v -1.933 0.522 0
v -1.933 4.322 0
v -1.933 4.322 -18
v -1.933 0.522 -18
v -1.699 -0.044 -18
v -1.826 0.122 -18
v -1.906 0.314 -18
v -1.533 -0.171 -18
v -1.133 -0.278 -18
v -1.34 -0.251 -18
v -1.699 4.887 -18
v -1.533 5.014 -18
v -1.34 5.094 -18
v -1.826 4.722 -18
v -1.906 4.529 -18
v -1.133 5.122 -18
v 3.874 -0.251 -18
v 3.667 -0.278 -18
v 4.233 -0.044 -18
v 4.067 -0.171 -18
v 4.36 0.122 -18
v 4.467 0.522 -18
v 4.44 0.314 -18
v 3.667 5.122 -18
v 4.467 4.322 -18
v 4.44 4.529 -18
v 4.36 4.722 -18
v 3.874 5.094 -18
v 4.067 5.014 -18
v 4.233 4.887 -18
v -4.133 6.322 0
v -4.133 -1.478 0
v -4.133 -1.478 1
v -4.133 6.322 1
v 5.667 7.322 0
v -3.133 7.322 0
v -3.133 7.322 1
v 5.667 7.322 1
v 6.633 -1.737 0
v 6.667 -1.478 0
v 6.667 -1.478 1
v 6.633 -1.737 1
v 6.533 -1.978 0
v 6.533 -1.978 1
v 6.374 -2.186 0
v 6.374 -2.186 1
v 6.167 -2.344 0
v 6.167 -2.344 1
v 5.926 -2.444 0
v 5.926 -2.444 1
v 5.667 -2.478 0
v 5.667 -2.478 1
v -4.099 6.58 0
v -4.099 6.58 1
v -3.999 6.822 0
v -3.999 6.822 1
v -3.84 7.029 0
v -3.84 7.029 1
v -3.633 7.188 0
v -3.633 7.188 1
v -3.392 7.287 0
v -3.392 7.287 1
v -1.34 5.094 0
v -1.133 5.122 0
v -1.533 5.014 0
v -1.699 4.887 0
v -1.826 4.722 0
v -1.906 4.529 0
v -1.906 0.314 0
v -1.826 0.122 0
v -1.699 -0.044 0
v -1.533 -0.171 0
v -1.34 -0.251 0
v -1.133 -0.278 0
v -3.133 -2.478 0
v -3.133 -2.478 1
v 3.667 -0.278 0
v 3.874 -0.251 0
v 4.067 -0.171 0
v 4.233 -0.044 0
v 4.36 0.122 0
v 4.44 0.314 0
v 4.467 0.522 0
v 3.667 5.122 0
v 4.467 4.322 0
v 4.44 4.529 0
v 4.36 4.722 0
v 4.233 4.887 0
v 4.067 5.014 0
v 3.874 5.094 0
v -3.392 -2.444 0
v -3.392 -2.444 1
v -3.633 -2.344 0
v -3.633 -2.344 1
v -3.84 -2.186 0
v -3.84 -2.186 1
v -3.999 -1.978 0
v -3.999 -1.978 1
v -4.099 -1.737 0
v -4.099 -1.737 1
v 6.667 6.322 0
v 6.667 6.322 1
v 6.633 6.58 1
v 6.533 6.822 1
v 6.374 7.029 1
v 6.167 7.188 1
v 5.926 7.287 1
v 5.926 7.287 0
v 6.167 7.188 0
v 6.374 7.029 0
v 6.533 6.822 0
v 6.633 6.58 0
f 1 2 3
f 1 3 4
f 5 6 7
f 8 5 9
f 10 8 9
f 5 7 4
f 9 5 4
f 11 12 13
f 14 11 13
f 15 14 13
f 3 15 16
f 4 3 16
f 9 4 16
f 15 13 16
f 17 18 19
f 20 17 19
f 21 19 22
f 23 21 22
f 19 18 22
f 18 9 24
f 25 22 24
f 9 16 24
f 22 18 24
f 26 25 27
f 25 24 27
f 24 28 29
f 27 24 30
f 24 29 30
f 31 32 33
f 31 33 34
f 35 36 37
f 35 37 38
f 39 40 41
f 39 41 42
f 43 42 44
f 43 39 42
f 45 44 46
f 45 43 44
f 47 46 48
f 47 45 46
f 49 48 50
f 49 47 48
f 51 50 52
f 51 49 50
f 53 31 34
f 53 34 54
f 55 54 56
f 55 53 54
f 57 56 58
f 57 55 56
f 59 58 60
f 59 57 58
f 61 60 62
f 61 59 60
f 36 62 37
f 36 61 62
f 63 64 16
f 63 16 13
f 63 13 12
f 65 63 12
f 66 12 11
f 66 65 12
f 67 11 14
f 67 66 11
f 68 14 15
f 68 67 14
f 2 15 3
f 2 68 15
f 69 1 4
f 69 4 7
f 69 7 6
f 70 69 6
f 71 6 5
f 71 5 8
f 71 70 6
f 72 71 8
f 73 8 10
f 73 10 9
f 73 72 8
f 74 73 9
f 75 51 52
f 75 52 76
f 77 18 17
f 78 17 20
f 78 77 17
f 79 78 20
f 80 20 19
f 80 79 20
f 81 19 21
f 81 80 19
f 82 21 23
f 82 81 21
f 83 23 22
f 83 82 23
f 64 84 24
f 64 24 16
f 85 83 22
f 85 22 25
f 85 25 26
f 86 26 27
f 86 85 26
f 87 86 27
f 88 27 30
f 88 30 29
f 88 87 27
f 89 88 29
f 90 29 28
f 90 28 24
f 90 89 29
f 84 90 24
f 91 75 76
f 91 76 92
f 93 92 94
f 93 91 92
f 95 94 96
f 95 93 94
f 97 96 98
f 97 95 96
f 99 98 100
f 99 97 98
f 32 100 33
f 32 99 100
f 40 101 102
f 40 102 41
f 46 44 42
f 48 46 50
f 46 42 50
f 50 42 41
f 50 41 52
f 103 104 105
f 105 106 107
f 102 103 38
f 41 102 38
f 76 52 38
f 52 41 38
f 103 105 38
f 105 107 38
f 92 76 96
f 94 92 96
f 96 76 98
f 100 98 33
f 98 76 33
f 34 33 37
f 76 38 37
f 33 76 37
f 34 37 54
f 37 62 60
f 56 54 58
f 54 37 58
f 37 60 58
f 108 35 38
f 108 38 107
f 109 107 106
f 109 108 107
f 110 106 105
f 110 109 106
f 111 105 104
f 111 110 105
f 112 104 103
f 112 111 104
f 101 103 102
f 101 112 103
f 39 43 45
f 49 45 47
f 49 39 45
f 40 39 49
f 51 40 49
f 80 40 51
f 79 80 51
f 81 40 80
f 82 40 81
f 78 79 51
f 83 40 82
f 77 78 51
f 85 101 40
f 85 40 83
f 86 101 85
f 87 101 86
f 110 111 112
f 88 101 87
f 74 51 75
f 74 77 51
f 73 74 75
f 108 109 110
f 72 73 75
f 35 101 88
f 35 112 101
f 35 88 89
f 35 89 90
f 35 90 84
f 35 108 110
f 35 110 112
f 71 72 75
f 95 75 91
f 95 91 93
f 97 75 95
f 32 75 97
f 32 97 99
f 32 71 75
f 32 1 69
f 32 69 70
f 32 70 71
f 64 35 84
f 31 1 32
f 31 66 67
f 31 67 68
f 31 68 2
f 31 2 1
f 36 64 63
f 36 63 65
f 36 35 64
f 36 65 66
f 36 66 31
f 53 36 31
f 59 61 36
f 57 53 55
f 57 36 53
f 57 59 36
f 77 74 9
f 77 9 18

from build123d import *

# Parameters (mm, degrees)
EXTRUDE_1_DEPTH = 1
EXTRUDE_2_DEPTH = 18


with BuildPart() as part:
    # 草图1 → 凸台-拉伸1 (new body)
    with BuildSketch(Plane.XY):
        with BuildLine():
            Line((-3.132848788, 7.321546969), (5.667151212, 7.321546969))
            ThreePointArc((5.667151212, 7.321546969), (6.374257994, 7.02865375), (6.667151212, 6.321546969))
            Line((6.667151212, 6.321546969), (6.667151212, -1.478453031))
            ThreePointArc((6.667151212, -1.478453031), (6.374257994, -2.185559812), (5.667151212, -2.478453031))
            Line((5.667151212, -2.478453031), (-3.132848788, -2.478453031))
            ThreePointArc((-3.132848788, -2.478453031), (-3.839955569, -2.185559812), (-4.132848788, -1.478453031))
            Line((-4.132848788, -1.478453031), (-4.132848788, 6.321546969))
            ThreePointArc((-4.132848788, 6.321546969), (-3.839955569, 7.02865375), (-3.132848788, 7.321546969))
        make_face()
    extrude(amount=EXTRUDE_1_DEPTH)

    # 草图2 → 凸台-拉伸2 (add)
    with BuildSketch(Plane(origin=(0, 0, 0), x_dir=(-1, 0, 0), z_dir=(0, 0, -1))):
        with BuildLine():
            Line((-3.667151212, 5.121546969), (1.132848788, 5.121546969))
            ThreePointArc((1.132848788, 5.121546969), (1.698534213, 4.887232394), (1.932848788, 4.321546969))
            Line((1.932848788, 4.321546969), (1.932848788, 0.521546969))
            ThreePointArc((1.932848788, 0.521546969), (1.698534213, -0.044138456), (1.132848788, -0.278453031))
            Line((1.132848788, -0.278453031), (-3.667151212, -0.278453031))
            ThreePointArc((-3.667151212, -0.278453031), (-4.232836637, -0.044138456), (-4.467151212, 0.521546969))
            Line((-4.467151212, 0.521546969), (-4.467151212, 4.321546969))
            ThreePointArc((-4.467151212, 4.321546969), (-4.232836637, 4.887232394), (-3.667151212, 5.121546969))
        make_face()
    extrude(amount=EXTRUDE_2_DEPTH)


solid = part.part
